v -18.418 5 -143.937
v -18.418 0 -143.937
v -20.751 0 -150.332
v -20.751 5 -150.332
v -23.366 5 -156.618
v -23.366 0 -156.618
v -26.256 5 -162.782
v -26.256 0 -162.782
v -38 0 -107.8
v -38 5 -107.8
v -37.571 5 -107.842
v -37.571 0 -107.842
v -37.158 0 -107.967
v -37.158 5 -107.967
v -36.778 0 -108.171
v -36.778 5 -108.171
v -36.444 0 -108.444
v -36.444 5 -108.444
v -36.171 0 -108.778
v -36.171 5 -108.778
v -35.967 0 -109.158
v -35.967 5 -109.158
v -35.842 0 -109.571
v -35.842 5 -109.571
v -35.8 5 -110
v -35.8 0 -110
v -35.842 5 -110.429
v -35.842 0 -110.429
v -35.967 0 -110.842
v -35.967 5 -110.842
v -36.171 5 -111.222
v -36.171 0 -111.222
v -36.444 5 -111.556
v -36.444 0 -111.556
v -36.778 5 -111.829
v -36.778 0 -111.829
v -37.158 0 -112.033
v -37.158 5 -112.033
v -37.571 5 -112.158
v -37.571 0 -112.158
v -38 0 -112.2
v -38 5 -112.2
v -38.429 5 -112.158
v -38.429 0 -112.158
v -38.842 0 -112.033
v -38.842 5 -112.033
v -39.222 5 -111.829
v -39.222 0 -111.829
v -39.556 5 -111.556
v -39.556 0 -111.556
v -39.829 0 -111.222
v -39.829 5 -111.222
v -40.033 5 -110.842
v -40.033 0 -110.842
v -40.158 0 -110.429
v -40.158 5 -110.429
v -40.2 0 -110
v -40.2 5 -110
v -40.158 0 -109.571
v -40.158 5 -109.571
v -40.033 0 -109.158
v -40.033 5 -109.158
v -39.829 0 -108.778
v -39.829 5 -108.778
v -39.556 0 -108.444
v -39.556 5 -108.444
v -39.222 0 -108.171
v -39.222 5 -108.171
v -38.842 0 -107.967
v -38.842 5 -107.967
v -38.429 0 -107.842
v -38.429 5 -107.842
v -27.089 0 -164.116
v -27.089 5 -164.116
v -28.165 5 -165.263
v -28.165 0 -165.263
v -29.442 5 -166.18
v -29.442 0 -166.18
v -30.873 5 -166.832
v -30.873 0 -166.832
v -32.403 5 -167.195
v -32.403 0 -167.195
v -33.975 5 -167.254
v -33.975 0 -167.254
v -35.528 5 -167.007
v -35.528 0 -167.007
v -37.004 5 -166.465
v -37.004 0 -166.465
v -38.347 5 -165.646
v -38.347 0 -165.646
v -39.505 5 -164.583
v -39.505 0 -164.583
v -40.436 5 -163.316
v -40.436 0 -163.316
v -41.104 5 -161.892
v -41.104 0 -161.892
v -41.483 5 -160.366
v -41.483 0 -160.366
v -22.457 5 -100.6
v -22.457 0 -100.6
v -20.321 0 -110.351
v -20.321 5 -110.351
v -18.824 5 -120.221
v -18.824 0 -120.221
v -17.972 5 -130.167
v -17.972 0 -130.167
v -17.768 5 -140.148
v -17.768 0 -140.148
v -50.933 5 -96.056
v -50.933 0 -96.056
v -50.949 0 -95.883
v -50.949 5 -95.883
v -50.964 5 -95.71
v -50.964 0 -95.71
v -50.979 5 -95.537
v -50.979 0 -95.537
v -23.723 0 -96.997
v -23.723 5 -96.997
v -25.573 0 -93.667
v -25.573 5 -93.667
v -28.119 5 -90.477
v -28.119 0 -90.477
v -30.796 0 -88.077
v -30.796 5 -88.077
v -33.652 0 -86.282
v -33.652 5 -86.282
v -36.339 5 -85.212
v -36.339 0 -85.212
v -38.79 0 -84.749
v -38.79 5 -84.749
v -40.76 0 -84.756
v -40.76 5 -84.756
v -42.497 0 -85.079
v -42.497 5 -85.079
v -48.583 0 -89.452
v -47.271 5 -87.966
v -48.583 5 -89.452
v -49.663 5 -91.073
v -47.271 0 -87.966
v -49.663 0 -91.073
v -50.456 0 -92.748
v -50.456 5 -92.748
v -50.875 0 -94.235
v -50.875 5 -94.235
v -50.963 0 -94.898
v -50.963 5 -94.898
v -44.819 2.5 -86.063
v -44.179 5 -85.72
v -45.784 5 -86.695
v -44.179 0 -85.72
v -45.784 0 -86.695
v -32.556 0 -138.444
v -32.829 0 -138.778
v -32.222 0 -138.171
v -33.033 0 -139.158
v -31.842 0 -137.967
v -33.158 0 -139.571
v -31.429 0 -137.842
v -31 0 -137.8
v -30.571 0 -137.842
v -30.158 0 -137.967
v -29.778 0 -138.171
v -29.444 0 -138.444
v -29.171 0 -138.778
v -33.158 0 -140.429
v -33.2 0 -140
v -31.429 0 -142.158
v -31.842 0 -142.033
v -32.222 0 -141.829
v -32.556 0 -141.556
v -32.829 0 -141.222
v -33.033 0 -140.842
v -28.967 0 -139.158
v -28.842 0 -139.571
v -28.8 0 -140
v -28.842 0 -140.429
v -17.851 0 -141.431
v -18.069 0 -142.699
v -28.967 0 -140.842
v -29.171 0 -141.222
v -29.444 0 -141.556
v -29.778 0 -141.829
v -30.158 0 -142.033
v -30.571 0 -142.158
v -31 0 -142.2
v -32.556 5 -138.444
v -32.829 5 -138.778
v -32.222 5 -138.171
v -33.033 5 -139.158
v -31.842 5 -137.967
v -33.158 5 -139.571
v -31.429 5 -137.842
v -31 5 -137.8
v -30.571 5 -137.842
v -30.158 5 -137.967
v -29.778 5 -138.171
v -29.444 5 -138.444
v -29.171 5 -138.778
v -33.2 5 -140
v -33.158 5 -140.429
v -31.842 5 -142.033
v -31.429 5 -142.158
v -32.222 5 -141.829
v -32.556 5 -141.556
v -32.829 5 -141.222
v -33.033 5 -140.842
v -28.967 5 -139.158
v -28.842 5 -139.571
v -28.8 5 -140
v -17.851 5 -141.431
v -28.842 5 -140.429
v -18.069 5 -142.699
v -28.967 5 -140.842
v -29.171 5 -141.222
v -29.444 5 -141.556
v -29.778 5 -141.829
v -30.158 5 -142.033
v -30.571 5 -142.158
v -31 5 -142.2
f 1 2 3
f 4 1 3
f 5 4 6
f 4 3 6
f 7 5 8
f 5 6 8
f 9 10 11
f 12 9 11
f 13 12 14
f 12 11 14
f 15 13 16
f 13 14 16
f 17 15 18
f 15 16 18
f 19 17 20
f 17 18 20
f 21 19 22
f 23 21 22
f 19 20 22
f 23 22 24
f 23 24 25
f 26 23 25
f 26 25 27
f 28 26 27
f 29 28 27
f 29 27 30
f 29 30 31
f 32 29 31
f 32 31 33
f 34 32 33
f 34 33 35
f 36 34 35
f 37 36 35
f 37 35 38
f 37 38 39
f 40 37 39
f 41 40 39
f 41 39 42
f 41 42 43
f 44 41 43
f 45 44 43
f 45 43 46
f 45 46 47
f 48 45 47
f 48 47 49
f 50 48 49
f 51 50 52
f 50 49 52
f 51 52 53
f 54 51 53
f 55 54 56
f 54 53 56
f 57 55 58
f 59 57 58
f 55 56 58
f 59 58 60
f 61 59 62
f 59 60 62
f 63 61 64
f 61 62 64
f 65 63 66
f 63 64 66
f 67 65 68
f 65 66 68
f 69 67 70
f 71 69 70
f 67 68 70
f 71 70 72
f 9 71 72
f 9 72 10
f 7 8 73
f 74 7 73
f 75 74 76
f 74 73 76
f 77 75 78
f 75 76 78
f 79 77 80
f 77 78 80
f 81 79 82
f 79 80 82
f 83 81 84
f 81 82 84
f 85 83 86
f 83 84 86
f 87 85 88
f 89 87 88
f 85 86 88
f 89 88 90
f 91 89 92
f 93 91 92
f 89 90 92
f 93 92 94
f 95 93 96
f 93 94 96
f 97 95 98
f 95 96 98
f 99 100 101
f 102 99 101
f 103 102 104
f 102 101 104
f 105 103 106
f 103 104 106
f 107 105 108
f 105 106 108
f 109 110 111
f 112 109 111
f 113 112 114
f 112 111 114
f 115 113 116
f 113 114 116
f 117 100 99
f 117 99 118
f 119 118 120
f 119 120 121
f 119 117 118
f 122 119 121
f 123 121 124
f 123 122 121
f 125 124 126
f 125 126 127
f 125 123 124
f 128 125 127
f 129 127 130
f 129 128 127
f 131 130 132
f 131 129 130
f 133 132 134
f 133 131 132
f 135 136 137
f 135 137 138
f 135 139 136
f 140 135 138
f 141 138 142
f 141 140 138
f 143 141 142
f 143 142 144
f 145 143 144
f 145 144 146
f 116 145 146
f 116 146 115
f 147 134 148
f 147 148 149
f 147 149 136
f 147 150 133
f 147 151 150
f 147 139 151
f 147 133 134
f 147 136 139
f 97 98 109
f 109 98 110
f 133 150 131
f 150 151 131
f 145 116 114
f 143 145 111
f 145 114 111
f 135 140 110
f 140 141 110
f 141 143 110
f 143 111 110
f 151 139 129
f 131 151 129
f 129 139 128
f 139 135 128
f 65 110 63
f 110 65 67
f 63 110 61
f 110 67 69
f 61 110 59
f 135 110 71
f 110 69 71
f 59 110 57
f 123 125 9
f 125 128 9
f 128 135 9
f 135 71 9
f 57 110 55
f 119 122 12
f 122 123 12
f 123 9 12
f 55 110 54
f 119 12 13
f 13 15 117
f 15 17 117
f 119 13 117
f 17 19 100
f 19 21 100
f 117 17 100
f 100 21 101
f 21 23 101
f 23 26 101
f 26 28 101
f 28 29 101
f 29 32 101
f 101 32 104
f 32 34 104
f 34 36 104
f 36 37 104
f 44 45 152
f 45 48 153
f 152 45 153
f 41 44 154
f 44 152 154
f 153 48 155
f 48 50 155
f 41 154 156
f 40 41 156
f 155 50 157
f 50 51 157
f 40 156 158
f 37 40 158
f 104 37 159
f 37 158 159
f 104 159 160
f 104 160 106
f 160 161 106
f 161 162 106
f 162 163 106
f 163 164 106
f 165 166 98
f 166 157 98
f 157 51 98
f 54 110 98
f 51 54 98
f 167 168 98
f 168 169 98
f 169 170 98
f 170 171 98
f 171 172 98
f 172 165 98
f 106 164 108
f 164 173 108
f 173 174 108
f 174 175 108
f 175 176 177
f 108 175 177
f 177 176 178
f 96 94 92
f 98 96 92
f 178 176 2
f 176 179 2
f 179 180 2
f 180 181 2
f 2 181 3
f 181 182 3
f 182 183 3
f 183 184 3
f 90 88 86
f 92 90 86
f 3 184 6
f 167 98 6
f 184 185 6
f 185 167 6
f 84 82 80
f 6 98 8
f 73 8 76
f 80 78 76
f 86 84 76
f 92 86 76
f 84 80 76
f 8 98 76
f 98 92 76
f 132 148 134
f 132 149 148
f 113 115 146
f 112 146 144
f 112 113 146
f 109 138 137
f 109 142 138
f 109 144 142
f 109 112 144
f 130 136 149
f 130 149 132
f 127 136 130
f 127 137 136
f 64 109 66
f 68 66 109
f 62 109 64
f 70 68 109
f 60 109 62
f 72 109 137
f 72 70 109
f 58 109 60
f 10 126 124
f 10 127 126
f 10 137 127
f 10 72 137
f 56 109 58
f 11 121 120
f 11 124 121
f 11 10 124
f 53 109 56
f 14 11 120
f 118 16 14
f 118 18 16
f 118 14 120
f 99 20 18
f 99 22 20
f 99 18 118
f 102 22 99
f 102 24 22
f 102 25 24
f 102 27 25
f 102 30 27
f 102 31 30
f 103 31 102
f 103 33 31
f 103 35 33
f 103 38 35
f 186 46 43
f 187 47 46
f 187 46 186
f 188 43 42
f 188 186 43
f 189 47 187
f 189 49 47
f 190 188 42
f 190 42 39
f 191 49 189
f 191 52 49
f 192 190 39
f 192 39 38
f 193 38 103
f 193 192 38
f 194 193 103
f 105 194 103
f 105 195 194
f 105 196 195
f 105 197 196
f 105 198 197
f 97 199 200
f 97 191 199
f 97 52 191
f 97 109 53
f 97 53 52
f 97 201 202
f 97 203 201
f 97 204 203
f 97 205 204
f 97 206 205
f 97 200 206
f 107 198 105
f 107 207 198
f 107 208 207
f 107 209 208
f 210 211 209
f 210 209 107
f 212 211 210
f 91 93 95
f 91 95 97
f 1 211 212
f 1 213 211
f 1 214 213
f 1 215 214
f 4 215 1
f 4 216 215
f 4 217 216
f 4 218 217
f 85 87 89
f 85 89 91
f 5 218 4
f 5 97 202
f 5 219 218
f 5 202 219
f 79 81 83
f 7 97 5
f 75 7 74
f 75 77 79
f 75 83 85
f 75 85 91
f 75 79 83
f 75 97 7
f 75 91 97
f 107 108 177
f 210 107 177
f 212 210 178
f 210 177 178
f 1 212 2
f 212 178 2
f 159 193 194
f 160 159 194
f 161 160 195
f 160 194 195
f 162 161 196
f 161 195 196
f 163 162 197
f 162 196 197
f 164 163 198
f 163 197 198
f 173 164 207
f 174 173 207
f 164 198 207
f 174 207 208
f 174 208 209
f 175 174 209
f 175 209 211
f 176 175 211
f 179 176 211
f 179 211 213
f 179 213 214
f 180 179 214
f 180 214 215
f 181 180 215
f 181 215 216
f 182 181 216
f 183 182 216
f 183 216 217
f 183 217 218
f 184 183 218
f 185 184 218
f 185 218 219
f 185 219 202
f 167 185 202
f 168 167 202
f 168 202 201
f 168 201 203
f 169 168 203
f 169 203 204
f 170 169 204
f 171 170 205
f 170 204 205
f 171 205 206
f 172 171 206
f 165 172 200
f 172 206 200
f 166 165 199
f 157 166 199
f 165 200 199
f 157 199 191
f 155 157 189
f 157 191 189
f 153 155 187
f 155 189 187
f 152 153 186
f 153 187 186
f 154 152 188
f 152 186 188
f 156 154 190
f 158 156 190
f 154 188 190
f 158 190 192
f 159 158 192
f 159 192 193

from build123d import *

# Parameters (mm, degrees)
BOSS_EXTRUDE2_DEPTH = 5
CUT_EXTRUDE1_REACH  = 176.937
SKETCH2_R           = 2.2


with BuildPart() as part:
    # Sketch1 → Boss-Extrude2 (new body)
    with BuildSketch(Plane(origin=(0, 0, 0), x_dir=(1, 0, 0), z_dir=(0, 1, 0))):
        with BuildLine():
            ThreePointArc((-26.256294904, 162.782156045), (-34.757388509, 167.168565439), (-41.482617684, 160.365590178))
            Line((-41.482617684, 160.365590178), (-50.932711484, 96.056215067))
            ThreePointArc((-50.932711484, 96.056215067), (-50.956557115, 95.796817406), (-50.979081843, 95.537301709))
            add(Edge.make_bspline(
                [(-22.456551163, 100.599709115), (-25.176477923, 89.862155319), (-41.371339617, 77.714728994), (-51.090796969, 92.352457993), (-50.979081843, 95.537301709)],
                knots=[0, 0, 0, 0, 0.694817922, 0.98396673, 0.98396673, 0.98396673, 0.98396673], degree=3))
            ThreePointArc((-22.456551163, 100.599709115), (-18.824269383, 120.221092129), (-17.76802696, 140.147870449))
            ThreePointArc((-17.76802696, 140.147870449), (-17.943181625, 142.067888002), (-18.417828761, 143.936539027))
            ThreePointArc((-18.417828761, 143.936539027), (-22.023480215, 153.489775682), (-26.256294904, 162.782156045))
        make_face()
    extrude(amount=BOSS_EXTRUDE2_DEPTH)

    # Sketch2 → Cut-Extrude1 (cut, up to next)
    with BuildSketch(Plane(origin=(0, 5, 0), x_dir=(1, 0, 0), z_dir=(0, 1, 0)), mode=Mode.PRIVATE) as cut_extrude1_sk1:
        with Locations(Location((-31, 140, 0), (0, 0, 270))):
            Circle(SKETCH2_R)
    cut_extrude1_tool1 = extrude(cut_extrude1_sk1.sketch, amount=-CUT_EXTRUDE1_REACH, mode=Mode.PRIVATE) & part.part
    # Sketch2 → Cut-Extrude1 (cut, up to next)
    with BuildSketch(Plane(origin=(0, 5, 0), x_dir=(1, 0, 0), z_dir=(0, 1, 0)), mode=Mode.PRIVATE) as cut_extrude1_sk2:
        with Locations(Location((-38, 110, 0), (0, 0, 270))):
            Circle(SKETCH2_R)
    cut_extrude1_tool2 = extrude(cut_extrude1_sk2.sketch, amount=-CUT_EXTRUDE1_REACH, mode=Mode.PRIVATE) & part.part
    add(cut_extrude1_tool1.solids().sort_by_distance((-31, 5, -140))[0], mode=Mode.SUBTRACT)
    add(cut_extrude1_tool2.solids().sort_by_distance((-38, 5, -110))[0], mode=Mode.SUBTRACT)


solid = part.part
